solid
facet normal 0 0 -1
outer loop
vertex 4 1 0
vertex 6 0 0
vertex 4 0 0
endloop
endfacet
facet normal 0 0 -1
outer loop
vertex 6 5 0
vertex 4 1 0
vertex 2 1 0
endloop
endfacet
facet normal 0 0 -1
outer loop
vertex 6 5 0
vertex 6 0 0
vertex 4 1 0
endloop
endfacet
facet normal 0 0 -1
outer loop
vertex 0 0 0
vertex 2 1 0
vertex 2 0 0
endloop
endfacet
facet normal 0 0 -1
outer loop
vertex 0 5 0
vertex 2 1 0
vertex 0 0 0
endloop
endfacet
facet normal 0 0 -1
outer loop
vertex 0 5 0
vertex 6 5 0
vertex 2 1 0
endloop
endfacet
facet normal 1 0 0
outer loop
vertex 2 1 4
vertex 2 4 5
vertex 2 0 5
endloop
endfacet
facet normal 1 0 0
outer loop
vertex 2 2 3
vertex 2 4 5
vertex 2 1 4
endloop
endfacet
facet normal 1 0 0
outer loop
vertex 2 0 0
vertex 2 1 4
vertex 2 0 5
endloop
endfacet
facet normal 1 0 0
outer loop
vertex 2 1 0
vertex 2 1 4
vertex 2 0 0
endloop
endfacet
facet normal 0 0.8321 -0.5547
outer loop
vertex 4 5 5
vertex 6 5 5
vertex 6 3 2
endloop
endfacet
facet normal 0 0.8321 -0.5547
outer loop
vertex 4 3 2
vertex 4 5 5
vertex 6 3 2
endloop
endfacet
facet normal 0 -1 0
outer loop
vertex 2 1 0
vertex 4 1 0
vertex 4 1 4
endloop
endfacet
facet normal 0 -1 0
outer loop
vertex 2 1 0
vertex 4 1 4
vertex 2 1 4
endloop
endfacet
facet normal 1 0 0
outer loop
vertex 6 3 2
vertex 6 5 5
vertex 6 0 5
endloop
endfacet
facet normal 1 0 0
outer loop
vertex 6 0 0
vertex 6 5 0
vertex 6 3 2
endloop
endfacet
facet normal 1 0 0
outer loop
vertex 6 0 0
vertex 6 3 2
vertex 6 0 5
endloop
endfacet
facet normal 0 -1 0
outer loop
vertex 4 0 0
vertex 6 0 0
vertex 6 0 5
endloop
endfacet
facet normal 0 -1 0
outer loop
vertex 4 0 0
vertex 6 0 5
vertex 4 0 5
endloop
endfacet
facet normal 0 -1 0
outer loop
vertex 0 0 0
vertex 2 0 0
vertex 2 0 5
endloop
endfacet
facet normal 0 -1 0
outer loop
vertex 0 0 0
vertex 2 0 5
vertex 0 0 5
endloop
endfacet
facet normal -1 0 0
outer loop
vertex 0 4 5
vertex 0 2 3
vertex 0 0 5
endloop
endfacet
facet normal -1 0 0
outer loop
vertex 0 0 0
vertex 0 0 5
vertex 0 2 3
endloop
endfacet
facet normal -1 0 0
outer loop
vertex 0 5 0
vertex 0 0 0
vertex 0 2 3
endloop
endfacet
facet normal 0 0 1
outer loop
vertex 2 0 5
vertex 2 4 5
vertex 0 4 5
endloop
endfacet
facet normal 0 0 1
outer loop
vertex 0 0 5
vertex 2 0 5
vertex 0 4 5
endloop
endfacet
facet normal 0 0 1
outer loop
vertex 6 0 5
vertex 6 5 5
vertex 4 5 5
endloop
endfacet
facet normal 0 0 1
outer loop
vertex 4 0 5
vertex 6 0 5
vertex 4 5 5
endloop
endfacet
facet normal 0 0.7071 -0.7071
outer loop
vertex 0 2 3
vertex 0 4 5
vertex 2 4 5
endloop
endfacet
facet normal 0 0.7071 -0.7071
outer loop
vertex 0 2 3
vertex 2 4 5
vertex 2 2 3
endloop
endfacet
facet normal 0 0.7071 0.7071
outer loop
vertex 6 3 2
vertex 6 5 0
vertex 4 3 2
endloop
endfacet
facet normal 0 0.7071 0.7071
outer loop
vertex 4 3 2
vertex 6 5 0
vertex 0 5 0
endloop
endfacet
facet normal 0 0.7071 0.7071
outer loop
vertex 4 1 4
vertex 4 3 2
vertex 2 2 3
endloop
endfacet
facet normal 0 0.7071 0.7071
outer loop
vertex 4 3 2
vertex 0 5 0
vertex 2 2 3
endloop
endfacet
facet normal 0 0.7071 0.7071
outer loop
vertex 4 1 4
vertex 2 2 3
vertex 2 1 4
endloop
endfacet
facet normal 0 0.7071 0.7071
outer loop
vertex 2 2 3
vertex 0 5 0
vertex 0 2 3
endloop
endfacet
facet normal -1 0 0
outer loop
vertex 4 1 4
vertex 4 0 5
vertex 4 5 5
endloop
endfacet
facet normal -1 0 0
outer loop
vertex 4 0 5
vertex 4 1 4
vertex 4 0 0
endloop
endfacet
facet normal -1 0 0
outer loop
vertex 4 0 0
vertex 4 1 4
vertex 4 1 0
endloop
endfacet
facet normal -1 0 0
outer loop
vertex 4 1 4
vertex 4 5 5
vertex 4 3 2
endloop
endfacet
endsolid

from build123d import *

# Parameters (mm, degrees)
BOSS_EXTRUDE2_DEPTH = 5
SKETCH23_W          = 2
SKETCH23_H          = 1
CUT_EXTRUDE16_DEPTH = 5
CUT_EXTRUDE17_DEPTH = 7
SKETCH25_W          = 2
SKETCH25_H          = 2
SKETCH25_H_2        = 3
BOSS_EXTRUDE5_DEPTH = 5
CUT_EXTRUDE18_DEPTH = 2
CUT_EXTRUDE19_DEPTH = 2


with BuildPart() as part:
    # Sketch7 → Boss-Extrude2 (new body)
    with BuildSketch(Plane.XY):
        Polygon((0, 0), (0, 5), (6, 5), (6, 0), (4, 0), (4, 1), (2, 1), (2, 0), align=None)
    extrude(amount=BOSS_EXTRUDE2_DEPTH)

    # Sketch23 → Cut-Extrude16 (cut)
    with BuildSketch(Plane(origin=(0, 5, 0), x_dir=(1, 0, 0), z_dir=(0, 1, 0))):
        with Locations((3, -4.5)):
            Rectangle(SKETCH23_W, SKETCH23_H)
    extrude(amount=-CUT_EXTRUDE16_DEPTH, mode=Mode.SUBTRACT)

    # Sketch24 → Cut-Extrude17 (cut)
    with BuildSketch(Plane.ZY):
        Polygon((0, 5), (4, 1), (4, 5), align=None)
    extrude(amount=-CUT_EXTRUDE17_DEPTH, mode=Mode.SUBTRACT)

    # Sketch25 → Boss-Extrude5 (add)
    with BuildSketch(Plane.XZ):
        with Locations((1, 4)):
            Rectangle(SKETCH25_W, SKETCH25_H)
        with Locations((5, 3.5)):
            Rectangle(SKETCH25_W, SKETCH25_H_2)
    extrude(amount=-BOSS_EXTRUDE5_DEPTH)

    # Sketch26 → Cut-Extrude18 (cut)
    with BuildSketch(Plane.ZY):
        Polygon((5, 5), (5, 4), (3, 2), (3, 5), align=None)
    extrude(amount=-CUT_EXTRUDE18_DEPTH, mode=Mode.SUBTRACT)

    # Sketch27 → Cut-Extrude19 (cut)
    with BuildSketch(Plane(origin=(6, 0, 0), x_dir=(0, 0, -1), z_dir=(1, 0, 0))):
        Polygon((-5, 5), (-2, 3), (-2, 5), align=None)
    extrude(amount=-CUT_EXTRUDE19_DEPTH, mode=Mode.SUBTRACT)


solid = part.part
